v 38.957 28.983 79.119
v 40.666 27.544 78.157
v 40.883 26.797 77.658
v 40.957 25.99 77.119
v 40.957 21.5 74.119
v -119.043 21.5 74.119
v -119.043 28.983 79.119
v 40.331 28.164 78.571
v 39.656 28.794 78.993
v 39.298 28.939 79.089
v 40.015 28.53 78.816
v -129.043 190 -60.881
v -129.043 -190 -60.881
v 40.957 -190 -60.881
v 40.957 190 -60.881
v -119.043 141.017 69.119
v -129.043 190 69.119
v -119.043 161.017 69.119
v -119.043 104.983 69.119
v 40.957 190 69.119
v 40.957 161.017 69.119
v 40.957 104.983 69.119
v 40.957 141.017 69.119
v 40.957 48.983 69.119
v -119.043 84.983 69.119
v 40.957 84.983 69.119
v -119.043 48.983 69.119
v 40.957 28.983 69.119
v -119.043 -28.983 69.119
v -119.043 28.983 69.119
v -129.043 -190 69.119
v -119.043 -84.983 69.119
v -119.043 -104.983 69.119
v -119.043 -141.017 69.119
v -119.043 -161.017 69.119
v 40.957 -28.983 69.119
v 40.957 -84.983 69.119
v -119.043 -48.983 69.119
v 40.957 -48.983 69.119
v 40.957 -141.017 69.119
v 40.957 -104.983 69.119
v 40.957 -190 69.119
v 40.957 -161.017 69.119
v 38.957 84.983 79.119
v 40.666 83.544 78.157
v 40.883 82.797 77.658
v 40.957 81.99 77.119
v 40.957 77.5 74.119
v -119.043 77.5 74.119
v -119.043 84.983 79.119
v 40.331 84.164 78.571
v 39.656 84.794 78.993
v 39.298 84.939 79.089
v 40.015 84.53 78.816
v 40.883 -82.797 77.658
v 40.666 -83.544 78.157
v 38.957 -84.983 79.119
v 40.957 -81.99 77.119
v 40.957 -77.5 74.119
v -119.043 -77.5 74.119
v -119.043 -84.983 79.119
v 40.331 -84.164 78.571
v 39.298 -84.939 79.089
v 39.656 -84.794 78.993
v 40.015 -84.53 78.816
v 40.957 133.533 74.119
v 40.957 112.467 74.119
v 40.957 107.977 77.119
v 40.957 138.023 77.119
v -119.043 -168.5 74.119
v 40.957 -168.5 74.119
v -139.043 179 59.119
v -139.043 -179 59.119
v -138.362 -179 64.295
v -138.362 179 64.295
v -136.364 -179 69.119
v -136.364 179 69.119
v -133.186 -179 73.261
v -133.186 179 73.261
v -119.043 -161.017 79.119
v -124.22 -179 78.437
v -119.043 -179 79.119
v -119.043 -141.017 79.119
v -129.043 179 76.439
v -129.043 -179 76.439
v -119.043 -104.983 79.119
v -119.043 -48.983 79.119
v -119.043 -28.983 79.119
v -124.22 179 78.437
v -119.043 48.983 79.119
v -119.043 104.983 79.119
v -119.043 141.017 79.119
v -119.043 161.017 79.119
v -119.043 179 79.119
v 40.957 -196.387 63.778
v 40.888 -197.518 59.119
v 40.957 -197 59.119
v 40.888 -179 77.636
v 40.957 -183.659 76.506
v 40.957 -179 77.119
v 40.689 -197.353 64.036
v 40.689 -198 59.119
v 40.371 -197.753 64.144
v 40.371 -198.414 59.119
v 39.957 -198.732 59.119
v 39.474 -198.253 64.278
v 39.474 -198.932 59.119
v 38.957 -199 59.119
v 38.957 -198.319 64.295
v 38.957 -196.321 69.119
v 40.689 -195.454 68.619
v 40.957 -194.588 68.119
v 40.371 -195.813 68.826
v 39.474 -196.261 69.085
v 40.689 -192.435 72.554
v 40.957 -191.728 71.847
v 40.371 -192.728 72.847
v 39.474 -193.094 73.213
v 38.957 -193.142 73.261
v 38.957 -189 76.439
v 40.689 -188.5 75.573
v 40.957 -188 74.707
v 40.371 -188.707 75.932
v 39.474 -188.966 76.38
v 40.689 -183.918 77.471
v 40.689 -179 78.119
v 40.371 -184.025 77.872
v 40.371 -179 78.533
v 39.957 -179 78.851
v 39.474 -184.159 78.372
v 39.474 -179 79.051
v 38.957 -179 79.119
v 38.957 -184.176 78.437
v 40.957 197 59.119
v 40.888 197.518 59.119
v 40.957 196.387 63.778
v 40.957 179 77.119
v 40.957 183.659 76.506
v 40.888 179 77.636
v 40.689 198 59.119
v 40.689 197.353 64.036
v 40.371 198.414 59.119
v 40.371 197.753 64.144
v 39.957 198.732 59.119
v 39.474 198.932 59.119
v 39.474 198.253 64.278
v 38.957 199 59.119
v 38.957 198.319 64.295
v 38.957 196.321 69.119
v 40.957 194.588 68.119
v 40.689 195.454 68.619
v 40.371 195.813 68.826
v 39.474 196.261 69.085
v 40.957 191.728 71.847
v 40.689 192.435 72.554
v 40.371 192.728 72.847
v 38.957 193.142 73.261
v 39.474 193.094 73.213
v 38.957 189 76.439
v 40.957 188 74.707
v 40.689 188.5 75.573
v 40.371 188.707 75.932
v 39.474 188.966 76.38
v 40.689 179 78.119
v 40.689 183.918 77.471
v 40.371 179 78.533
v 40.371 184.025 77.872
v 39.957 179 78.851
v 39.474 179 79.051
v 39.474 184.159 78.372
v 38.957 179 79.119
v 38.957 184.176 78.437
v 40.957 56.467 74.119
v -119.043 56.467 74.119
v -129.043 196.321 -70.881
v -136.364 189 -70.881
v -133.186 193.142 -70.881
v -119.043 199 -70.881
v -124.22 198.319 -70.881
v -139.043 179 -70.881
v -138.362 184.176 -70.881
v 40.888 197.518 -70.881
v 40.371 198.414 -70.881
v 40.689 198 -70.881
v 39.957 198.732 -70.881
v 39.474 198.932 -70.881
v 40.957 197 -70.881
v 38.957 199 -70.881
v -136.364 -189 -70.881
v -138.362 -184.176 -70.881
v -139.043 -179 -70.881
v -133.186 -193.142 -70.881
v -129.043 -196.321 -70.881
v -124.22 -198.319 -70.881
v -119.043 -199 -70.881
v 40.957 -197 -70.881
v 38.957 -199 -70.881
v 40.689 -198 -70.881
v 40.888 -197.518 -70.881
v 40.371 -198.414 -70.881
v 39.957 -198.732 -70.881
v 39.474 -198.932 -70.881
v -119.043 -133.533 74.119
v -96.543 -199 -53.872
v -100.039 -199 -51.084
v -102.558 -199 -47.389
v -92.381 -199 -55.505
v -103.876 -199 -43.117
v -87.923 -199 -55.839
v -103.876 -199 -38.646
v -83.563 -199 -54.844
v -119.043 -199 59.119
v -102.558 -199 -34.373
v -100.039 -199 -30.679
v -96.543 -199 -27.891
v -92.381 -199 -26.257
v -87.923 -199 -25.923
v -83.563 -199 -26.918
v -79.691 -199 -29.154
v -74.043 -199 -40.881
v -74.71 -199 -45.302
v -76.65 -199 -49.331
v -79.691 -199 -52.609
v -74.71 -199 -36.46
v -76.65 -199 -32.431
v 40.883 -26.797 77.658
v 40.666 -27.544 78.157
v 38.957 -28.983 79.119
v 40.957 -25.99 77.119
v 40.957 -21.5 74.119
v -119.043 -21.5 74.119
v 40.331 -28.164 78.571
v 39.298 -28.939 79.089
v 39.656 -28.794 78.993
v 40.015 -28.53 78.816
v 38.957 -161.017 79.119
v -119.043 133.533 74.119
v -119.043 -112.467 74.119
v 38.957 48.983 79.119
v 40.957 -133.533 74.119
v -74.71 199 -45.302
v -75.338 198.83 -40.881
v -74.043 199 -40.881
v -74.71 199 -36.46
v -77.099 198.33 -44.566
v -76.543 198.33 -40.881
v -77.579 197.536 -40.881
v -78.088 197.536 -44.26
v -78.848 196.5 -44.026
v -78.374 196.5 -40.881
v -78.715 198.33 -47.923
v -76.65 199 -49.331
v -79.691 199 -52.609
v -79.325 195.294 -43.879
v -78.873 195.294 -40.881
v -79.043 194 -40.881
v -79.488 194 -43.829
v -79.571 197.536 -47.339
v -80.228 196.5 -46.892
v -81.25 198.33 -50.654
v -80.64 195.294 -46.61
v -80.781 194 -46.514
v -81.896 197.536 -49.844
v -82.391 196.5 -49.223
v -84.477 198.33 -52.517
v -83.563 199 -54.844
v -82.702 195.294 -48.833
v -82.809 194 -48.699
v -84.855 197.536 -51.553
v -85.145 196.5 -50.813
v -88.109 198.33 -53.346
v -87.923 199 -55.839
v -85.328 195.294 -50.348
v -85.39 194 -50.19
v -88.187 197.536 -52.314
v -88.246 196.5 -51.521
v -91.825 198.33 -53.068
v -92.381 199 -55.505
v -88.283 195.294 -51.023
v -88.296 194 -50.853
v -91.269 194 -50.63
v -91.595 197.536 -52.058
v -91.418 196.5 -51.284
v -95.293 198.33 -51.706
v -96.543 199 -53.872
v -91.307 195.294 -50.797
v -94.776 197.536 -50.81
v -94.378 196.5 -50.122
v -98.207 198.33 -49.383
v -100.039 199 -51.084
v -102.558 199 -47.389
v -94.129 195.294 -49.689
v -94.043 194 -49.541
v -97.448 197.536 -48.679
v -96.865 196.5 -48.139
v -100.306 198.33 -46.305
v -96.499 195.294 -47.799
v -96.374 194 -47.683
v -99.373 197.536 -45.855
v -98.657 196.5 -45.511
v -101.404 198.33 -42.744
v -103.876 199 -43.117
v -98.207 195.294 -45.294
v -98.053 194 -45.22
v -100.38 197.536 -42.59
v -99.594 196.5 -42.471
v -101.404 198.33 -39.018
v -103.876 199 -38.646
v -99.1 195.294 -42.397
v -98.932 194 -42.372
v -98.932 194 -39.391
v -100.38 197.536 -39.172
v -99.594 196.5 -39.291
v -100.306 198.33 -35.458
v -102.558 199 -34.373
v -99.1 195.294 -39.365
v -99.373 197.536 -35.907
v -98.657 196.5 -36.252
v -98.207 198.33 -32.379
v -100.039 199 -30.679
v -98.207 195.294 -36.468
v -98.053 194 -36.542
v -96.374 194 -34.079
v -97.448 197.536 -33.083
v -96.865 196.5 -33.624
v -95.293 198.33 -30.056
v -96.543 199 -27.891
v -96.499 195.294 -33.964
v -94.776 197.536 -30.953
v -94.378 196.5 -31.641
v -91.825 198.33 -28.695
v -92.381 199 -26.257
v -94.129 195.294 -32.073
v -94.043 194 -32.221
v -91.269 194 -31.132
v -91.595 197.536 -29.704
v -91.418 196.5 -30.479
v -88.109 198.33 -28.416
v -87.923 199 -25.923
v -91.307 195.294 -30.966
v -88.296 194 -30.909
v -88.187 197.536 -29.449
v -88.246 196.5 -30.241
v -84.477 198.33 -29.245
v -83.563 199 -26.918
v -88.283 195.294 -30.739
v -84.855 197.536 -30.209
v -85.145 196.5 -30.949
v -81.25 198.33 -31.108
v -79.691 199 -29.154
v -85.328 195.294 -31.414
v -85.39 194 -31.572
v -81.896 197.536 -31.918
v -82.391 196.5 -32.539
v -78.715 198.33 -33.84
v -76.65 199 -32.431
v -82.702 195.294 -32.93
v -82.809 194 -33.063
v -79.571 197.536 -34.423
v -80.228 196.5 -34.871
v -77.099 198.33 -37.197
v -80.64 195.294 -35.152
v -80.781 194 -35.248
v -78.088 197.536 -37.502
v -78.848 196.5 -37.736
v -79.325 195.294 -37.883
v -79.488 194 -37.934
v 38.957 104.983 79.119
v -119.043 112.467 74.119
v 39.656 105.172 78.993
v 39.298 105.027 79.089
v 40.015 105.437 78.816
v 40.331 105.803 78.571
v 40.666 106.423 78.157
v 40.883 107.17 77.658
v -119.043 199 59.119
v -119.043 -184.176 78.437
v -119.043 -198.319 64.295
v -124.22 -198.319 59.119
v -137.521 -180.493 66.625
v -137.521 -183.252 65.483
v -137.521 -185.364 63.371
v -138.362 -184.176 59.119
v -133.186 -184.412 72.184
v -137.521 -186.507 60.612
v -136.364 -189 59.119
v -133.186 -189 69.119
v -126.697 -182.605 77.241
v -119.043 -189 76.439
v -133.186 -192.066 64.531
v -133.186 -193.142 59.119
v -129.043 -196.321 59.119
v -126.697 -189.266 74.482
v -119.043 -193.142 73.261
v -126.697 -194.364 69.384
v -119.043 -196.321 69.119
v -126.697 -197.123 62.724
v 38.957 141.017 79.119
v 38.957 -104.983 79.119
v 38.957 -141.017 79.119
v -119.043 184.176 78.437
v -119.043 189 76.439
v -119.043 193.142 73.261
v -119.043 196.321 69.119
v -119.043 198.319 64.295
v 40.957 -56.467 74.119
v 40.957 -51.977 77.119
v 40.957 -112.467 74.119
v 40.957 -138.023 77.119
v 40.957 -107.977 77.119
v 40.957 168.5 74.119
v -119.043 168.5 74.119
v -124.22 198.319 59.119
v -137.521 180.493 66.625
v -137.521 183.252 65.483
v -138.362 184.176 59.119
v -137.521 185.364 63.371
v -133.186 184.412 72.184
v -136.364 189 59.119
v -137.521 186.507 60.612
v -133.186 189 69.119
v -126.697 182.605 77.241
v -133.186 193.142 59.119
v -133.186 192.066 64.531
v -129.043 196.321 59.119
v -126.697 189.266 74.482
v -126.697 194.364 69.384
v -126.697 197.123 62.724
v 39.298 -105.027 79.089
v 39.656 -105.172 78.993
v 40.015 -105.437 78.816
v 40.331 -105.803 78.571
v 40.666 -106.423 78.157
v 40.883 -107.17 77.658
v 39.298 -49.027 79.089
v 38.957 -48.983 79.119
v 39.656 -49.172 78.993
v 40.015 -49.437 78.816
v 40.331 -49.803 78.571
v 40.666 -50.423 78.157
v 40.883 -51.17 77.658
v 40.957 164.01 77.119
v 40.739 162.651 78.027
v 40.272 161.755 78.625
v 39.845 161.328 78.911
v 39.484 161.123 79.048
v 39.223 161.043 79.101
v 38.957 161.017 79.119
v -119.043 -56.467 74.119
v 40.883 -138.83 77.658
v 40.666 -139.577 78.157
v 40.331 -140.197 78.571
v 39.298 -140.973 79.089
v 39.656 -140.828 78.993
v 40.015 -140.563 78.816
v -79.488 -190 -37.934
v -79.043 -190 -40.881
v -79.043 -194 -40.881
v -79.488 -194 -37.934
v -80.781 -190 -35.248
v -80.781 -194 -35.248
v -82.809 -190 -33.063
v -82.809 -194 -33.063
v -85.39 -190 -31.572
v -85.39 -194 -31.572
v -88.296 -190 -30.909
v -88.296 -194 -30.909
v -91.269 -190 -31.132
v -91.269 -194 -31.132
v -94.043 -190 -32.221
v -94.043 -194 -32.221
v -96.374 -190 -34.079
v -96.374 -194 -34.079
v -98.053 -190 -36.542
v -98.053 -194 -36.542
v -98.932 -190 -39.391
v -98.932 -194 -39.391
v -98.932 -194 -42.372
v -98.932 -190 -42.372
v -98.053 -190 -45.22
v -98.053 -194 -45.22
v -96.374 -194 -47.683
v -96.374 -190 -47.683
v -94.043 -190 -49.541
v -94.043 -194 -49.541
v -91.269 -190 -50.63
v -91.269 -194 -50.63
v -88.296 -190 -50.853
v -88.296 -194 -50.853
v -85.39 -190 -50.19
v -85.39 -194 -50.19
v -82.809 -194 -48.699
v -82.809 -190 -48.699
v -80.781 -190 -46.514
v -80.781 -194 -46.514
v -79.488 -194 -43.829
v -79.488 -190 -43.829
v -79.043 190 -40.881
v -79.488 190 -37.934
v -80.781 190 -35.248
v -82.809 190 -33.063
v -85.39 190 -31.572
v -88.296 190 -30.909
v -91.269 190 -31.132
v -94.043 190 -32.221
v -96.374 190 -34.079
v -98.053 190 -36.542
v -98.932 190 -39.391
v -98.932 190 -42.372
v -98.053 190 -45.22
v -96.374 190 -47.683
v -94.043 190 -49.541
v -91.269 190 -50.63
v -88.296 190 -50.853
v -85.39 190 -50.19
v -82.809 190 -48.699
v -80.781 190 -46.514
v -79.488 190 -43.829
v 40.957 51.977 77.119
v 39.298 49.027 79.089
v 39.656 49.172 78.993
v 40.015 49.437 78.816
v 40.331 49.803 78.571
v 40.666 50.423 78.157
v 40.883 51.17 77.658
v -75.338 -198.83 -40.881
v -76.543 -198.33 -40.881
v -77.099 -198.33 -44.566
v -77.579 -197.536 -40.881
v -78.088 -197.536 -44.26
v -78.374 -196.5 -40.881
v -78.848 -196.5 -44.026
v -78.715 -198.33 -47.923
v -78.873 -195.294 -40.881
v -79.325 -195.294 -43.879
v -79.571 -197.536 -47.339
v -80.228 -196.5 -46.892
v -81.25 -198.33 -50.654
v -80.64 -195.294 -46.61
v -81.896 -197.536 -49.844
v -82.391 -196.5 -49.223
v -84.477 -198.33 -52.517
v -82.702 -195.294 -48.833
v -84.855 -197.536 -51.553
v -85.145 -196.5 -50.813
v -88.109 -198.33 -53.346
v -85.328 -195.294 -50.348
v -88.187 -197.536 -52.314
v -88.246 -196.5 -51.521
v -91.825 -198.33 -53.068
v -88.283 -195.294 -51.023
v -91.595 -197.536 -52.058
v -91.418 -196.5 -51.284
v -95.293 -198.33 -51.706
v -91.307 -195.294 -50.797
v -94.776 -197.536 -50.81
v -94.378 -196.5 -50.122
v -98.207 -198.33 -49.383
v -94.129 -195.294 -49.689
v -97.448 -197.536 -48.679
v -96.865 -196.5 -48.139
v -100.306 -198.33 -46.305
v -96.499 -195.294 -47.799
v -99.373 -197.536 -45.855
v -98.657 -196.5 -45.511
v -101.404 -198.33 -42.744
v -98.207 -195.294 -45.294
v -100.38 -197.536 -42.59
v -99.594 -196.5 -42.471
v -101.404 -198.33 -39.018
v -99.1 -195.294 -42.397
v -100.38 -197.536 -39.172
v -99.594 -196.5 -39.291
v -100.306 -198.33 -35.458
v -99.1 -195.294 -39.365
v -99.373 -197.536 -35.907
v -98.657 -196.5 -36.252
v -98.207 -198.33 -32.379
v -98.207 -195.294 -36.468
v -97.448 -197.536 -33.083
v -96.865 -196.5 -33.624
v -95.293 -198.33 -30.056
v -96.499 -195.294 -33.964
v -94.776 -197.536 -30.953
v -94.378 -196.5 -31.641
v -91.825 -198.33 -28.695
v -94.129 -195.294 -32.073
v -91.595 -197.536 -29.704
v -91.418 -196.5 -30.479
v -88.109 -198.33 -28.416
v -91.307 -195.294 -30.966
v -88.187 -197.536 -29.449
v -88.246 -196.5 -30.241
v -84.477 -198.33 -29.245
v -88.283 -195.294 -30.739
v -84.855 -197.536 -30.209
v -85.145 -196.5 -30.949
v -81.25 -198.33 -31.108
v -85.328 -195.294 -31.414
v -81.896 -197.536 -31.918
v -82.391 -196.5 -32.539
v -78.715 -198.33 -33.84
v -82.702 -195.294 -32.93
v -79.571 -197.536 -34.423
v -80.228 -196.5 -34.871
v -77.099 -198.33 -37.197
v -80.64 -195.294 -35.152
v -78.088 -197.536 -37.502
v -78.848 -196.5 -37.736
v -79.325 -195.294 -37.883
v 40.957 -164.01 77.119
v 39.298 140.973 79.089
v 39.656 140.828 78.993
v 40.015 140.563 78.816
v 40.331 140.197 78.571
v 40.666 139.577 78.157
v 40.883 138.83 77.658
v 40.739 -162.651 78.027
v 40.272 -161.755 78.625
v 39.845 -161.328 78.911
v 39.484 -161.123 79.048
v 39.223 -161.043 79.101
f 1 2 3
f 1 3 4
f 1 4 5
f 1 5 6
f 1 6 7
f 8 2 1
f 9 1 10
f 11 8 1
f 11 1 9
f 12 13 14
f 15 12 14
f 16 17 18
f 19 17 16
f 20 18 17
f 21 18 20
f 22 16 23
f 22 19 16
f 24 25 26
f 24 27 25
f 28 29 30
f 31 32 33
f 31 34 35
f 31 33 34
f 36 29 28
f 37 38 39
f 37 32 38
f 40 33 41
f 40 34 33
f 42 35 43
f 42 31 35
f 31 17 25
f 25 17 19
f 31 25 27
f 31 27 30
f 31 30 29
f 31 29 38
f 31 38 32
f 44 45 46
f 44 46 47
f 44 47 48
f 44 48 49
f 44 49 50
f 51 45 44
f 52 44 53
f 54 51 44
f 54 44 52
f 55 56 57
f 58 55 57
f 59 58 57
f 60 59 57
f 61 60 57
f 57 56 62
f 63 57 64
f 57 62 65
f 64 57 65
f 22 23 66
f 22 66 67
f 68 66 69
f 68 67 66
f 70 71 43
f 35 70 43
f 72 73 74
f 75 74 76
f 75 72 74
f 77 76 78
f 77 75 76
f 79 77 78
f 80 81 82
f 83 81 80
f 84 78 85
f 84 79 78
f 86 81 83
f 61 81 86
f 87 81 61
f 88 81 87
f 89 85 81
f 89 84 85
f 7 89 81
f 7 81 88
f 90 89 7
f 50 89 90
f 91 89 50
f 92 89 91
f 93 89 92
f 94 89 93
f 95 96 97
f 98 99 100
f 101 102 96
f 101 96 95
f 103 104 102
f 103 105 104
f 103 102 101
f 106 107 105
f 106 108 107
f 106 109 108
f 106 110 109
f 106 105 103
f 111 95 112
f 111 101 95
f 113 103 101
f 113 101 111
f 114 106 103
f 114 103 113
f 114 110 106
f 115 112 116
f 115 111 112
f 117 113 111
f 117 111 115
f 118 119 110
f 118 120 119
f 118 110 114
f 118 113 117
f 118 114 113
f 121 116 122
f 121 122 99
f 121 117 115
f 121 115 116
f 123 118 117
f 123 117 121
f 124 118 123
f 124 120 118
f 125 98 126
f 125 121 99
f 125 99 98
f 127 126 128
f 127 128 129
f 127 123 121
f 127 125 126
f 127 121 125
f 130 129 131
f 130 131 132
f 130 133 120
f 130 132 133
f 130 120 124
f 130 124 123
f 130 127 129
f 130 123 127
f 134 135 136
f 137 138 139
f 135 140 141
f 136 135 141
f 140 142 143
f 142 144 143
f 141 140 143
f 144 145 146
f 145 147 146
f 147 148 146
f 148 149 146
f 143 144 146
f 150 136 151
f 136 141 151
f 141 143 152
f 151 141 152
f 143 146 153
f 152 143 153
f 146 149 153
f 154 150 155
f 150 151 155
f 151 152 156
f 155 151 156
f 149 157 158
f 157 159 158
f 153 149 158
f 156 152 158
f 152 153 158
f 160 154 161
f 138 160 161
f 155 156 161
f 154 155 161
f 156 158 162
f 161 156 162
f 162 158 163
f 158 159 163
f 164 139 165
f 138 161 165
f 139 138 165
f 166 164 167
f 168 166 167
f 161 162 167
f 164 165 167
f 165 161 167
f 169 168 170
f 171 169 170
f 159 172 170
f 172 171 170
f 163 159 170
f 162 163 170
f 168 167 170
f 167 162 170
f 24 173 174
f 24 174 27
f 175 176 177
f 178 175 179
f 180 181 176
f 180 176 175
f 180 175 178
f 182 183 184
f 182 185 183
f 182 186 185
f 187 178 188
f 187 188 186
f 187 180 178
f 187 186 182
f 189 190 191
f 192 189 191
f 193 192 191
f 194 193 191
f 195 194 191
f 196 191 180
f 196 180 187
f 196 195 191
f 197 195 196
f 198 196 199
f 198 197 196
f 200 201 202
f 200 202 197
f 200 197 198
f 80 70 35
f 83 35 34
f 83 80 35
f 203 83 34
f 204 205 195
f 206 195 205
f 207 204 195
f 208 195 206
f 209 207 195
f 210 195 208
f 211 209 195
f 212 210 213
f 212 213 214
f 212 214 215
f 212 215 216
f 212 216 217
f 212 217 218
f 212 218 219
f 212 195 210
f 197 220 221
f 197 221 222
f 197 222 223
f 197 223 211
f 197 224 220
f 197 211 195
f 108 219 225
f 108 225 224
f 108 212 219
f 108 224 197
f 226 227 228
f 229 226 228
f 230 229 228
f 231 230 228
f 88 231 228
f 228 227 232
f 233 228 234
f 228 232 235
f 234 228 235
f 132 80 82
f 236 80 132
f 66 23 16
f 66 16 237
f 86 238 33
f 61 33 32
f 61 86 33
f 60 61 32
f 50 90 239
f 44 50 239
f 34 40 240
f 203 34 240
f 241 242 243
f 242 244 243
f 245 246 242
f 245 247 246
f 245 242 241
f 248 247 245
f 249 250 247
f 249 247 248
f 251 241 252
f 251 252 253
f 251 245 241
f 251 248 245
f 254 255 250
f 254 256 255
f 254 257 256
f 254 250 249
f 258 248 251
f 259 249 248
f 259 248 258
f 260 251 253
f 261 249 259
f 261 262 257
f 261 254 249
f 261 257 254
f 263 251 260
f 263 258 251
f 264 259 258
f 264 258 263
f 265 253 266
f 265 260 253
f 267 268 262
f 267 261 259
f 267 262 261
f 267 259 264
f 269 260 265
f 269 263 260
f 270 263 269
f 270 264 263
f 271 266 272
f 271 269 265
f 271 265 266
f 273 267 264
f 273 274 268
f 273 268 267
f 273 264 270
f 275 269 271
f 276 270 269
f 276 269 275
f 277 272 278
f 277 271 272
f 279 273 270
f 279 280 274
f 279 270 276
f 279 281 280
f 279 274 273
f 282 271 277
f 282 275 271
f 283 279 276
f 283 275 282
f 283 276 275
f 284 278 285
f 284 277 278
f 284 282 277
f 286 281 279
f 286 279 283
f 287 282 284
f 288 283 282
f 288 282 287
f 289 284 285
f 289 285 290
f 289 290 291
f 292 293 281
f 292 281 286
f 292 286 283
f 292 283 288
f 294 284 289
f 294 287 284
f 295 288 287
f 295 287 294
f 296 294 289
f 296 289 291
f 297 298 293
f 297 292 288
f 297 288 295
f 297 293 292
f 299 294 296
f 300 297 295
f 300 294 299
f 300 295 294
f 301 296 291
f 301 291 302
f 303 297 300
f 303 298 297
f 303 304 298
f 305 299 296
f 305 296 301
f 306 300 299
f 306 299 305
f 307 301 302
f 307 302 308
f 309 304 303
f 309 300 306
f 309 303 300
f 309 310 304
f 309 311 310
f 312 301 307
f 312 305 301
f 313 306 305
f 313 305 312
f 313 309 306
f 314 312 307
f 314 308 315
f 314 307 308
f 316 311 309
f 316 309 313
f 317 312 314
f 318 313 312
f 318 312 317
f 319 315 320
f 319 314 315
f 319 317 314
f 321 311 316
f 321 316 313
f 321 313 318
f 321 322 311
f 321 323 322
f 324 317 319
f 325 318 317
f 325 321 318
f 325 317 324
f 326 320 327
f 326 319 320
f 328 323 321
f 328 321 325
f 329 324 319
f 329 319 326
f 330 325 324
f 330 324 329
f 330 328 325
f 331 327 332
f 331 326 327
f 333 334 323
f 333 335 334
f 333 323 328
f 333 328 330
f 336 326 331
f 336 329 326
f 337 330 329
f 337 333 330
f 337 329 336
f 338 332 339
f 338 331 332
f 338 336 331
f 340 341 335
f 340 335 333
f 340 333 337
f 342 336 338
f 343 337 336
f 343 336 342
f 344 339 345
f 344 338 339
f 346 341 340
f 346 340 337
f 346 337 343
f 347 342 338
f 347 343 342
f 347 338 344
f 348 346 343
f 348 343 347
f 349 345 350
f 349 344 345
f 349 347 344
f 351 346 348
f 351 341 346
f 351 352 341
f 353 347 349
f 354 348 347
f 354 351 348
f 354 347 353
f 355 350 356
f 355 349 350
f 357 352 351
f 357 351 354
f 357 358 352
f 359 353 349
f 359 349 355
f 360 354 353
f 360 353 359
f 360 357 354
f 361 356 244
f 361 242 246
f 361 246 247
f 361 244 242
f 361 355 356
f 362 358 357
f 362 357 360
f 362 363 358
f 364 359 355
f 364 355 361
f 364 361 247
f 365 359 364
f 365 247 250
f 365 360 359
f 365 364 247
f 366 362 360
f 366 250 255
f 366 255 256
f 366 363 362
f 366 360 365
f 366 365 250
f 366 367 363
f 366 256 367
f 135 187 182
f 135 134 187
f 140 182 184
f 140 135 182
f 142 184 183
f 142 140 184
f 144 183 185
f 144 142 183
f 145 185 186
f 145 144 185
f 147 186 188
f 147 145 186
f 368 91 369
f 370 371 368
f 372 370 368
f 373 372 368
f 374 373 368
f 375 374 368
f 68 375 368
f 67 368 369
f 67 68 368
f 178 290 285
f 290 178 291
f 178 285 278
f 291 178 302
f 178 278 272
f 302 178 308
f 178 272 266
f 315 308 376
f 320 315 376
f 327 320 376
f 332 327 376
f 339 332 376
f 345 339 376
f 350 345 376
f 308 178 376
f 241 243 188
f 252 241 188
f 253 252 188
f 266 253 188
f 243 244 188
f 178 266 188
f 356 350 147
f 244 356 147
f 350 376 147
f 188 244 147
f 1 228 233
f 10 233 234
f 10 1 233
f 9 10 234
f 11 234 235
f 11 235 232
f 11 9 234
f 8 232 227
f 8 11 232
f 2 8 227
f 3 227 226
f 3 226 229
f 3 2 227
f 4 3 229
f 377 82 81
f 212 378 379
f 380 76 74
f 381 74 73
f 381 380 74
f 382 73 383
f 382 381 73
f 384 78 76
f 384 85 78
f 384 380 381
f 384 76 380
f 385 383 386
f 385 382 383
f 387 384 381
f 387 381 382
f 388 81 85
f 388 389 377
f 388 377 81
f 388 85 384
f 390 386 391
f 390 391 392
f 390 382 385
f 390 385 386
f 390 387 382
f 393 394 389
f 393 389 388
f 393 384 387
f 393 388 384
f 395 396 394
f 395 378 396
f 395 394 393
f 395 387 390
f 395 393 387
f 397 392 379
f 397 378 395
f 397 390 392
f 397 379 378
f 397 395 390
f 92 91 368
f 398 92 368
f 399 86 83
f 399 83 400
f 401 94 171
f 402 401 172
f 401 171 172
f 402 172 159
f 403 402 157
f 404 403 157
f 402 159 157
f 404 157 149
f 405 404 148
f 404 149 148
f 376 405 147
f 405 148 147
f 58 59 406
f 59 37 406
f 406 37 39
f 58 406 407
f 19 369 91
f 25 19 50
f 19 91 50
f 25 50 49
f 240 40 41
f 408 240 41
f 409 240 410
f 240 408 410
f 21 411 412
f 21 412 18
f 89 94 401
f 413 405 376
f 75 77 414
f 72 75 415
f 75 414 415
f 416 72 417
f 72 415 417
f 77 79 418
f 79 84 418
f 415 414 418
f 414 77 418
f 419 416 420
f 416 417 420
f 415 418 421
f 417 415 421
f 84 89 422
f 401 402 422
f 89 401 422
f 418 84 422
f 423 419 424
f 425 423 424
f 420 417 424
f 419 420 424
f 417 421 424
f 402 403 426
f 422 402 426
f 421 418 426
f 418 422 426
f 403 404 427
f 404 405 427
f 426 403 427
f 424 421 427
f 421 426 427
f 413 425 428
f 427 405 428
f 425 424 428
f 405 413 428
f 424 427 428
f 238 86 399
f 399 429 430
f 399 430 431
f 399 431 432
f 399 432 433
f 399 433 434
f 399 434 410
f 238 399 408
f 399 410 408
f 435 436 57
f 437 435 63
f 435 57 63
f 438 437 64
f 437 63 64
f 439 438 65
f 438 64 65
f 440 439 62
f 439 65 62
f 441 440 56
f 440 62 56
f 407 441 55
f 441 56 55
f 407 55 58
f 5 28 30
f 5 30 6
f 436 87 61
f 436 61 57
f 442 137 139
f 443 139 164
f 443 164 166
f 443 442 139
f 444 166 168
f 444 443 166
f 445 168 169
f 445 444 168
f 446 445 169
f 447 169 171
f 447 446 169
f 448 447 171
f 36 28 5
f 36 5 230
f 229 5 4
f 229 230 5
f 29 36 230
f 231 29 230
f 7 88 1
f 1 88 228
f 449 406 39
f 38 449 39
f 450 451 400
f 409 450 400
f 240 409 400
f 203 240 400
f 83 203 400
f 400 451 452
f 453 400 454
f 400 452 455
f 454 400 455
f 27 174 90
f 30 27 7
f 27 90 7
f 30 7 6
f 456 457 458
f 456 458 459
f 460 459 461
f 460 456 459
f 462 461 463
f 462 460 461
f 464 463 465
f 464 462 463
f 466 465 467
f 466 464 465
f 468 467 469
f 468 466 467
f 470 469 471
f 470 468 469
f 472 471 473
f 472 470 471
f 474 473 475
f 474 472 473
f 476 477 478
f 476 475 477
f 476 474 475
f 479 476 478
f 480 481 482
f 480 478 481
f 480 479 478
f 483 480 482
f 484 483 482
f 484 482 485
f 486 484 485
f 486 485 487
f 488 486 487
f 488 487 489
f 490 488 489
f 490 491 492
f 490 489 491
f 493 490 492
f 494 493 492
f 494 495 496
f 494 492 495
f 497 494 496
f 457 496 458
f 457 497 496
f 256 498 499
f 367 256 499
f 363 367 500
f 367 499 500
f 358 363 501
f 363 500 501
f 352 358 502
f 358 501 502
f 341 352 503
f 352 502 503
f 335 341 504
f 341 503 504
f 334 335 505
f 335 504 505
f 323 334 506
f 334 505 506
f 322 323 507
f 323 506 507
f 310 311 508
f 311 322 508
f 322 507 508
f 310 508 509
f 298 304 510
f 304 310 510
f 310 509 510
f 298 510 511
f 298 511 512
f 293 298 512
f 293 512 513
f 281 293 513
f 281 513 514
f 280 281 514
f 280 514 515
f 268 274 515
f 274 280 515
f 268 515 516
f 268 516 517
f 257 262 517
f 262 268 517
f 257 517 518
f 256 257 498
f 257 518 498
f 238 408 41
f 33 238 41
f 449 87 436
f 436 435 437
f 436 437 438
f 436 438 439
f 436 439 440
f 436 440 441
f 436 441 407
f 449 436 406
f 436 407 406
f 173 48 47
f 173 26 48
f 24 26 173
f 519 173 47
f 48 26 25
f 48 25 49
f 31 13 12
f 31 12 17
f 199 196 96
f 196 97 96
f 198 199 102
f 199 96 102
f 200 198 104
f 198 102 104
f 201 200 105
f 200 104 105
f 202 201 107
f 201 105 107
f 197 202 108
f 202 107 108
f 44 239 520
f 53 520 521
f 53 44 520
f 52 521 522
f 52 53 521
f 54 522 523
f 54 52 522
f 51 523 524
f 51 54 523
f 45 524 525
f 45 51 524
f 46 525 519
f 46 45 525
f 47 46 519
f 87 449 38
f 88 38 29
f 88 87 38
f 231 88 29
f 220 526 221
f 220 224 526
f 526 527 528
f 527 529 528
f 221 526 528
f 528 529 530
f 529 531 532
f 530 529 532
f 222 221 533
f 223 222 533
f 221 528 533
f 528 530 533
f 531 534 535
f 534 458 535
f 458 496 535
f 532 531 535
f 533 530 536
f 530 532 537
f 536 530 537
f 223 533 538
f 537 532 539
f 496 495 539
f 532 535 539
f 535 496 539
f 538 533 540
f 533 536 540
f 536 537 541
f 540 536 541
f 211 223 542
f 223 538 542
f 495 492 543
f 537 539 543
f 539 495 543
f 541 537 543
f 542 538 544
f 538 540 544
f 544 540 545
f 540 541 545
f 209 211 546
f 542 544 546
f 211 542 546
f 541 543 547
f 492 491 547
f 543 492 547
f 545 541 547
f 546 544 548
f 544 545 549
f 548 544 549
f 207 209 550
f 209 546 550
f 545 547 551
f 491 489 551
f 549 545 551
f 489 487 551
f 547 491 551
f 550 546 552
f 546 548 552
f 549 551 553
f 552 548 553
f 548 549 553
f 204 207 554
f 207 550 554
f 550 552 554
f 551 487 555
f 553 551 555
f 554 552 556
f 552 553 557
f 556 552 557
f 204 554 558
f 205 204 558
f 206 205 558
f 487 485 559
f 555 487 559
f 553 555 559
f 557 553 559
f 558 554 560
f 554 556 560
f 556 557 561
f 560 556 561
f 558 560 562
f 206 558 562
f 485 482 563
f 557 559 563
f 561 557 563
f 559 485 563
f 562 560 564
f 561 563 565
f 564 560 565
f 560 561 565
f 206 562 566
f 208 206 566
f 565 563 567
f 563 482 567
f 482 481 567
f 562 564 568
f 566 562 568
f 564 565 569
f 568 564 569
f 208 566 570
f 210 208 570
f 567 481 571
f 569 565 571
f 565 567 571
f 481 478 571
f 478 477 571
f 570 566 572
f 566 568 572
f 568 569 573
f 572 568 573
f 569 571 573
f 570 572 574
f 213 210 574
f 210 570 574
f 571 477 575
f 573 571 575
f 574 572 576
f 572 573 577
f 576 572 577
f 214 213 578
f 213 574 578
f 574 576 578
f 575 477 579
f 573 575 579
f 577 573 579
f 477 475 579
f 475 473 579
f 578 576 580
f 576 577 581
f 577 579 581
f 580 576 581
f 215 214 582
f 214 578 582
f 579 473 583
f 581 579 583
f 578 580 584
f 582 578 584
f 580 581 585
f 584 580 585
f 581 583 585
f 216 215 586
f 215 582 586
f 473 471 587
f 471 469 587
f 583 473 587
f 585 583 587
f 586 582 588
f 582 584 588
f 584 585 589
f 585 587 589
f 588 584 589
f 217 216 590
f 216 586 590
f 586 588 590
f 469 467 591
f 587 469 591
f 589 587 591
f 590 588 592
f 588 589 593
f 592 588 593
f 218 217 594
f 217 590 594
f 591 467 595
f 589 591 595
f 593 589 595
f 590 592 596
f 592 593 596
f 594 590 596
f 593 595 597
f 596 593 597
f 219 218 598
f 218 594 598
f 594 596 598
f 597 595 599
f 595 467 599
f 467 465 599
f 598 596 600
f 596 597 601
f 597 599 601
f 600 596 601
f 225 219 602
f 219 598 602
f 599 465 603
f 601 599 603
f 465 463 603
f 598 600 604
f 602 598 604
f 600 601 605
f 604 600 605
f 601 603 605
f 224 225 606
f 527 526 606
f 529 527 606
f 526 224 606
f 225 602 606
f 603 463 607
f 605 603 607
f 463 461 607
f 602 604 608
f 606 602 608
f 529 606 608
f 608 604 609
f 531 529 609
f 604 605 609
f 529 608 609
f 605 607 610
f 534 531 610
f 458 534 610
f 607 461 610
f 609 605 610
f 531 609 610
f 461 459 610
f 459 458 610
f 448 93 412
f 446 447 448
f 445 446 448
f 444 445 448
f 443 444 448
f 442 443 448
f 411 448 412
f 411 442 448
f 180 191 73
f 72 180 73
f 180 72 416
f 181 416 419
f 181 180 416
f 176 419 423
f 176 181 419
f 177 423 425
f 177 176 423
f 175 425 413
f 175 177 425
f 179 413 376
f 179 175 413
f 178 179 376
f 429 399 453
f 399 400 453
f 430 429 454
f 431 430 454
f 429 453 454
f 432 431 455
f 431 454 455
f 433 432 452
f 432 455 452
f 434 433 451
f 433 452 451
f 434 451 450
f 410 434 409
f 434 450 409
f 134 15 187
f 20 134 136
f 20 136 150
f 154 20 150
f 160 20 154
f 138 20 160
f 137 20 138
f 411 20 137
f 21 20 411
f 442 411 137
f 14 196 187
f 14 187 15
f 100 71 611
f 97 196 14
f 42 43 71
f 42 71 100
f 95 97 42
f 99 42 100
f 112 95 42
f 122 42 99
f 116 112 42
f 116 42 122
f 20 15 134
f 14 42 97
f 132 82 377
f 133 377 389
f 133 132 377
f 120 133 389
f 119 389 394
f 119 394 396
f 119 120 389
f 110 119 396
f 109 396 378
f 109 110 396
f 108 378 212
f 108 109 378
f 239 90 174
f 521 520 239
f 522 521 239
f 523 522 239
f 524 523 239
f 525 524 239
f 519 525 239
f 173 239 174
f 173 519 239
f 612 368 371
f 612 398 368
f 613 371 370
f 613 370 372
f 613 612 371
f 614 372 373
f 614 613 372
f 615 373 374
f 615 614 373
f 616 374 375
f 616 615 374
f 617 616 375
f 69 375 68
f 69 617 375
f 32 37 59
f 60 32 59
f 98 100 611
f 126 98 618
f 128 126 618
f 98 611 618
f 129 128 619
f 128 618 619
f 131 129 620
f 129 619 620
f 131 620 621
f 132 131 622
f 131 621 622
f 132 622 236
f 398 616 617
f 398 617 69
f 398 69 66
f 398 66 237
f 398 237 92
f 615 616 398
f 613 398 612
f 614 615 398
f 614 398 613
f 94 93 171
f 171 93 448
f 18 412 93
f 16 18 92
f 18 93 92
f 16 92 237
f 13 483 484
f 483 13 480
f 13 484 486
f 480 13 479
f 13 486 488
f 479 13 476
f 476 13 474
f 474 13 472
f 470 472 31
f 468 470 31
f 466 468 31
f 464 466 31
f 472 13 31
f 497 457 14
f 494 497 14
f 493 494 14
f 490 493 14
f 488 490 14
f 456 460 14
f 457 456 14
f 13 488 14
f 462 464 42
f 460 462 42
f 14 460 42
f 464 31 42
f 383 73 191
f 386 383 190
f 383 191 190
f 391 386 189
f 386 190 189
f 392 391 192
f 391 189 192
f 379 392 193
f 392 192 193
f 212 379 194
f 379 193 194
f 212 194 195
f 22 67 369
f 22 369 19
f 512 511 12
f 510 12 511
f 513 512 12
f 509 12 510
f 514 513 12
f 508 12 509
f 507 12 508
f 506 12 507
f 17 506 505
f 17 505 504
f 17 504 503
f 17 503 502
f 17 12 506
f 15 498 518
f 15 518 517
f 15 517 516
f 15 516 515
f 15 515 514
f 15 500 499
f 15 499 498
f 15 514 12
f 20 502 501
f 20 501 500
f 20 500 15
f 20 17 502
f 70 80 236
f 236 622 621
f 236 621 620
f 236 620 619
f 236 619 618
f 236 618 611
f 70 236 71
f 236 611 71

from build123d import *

# Parameters (mm, degrees)
F0_W     = 180
F0_H     = 150
F1_DEPTH = 199
F2_R     = 20
F3_R     = 20
F4_W     = 387.1927191635
F4_H     = 130
F5_DEPTH = 190
F7_DEPTH = 160
F8_R     = 10
F9_DEPTH = 264.3
F10_R    = 2
F11_R    = 5


with BuildPart() as f1:
    # F0 (on Front) → F1 (new body)
    with BuildSketch(Plane.XZ):
        with Locations((-49.0434786677, 4.1188420764)):
            Rectangle(F0_W, F0_H)
    extrude(amount=F1_DEPTH)

    # F2
    f2_edges = [f1.edges().sort_by_distance(p)[0] for p in [
        (-49.043479, -199, 79.118842),
    ]]
    fillet(f2_edges, radius=F2_R)

    # F3
    f3_edges = [f1.edges().sort_by_distance(p)[0] for p in [
        (-139.043479, -89.5, 79.118842),
    ]]
    fillet(f3_edges, radius=F3_R)

    # F4 (on Front) → F5 (cut)
    with BuildSketch(Plane.XZ):
        with Locations((64.552880914, 4.1188420764)):
            Rectangle(F4_W, F4_H)
    extrude(amount=F5_DEPTH, mode=Mode.SUBTRACT)

    # F6 (on face) → F7 (cut)
    with BuildSketch(Plane.YZ.offset(40.9565213323)):
        Polygon((-133.5333704529, 74.1188420764), (-141.0166852265, 79.1188420764), (-161.0166852265, 79.1188420764), (-168.5, 74.1188420764), (-161.0166852265, 69.1188420764), (-141.0166852265, 69.1188420764), align=None)
        Polygon((-84.9833147735, 79.1188420764), (-104.9833147735, 79.1188420764), (-112.4666295471, 74.1188420764), (-104.9833147735, 69.1188420764), (-84.9833147735, 69.1188420764), (-77.5, 74.1188420764), align=None)
        Polygon((-28.9833147735, 79.1188420764), (-48.9833147735, 79.1188420764), (-56.4666295471, 74.1188420764), (-48.9833147735, 69.1188420764), (-28.9833147735, 69.1188420764), (-21.5, 74.1188420764), align=None)
    extrude(amount=-F7_DEPTH, mode=Mode.SUBTRACT)

    # F8 (on Front) → F9 (cut)
    with BuildSketch(Plane.XZ):
        with Locations((-89.0434786677, -40.8811579236)):
            Circle(F8_R)
    extrude(amount=F9_DEPTH, mode=Mode.SUBTRACT)

    # F10
    f10_edges = [f1.edges().sort_by_distance(p)[0] for p in [
        (40.956521, -199, -5.881158),
        (40.956521, -193.142136, 73.260978),
        (40.956521, -123, 79.118842),
        (40.956521, -66.983315, 79.118842),
        (40.956521, -14.491657, 79.118842),
    ]]
    fillet(f10_edges, radius=F10_R)

    # F11
    f11_edges = [f1.edges().sort_by_distance(p)[0] for p in [
        (-99.043479, -199, -40.881158),
    ]]
    fillet(f11_edges, radius=F11_R)

    # F12: F1 across plane


with BuildPart() as f1_1:
    add(f1.part)
    add(f1.part.mirror(Plane.XZ))


solid = f1_1.part
